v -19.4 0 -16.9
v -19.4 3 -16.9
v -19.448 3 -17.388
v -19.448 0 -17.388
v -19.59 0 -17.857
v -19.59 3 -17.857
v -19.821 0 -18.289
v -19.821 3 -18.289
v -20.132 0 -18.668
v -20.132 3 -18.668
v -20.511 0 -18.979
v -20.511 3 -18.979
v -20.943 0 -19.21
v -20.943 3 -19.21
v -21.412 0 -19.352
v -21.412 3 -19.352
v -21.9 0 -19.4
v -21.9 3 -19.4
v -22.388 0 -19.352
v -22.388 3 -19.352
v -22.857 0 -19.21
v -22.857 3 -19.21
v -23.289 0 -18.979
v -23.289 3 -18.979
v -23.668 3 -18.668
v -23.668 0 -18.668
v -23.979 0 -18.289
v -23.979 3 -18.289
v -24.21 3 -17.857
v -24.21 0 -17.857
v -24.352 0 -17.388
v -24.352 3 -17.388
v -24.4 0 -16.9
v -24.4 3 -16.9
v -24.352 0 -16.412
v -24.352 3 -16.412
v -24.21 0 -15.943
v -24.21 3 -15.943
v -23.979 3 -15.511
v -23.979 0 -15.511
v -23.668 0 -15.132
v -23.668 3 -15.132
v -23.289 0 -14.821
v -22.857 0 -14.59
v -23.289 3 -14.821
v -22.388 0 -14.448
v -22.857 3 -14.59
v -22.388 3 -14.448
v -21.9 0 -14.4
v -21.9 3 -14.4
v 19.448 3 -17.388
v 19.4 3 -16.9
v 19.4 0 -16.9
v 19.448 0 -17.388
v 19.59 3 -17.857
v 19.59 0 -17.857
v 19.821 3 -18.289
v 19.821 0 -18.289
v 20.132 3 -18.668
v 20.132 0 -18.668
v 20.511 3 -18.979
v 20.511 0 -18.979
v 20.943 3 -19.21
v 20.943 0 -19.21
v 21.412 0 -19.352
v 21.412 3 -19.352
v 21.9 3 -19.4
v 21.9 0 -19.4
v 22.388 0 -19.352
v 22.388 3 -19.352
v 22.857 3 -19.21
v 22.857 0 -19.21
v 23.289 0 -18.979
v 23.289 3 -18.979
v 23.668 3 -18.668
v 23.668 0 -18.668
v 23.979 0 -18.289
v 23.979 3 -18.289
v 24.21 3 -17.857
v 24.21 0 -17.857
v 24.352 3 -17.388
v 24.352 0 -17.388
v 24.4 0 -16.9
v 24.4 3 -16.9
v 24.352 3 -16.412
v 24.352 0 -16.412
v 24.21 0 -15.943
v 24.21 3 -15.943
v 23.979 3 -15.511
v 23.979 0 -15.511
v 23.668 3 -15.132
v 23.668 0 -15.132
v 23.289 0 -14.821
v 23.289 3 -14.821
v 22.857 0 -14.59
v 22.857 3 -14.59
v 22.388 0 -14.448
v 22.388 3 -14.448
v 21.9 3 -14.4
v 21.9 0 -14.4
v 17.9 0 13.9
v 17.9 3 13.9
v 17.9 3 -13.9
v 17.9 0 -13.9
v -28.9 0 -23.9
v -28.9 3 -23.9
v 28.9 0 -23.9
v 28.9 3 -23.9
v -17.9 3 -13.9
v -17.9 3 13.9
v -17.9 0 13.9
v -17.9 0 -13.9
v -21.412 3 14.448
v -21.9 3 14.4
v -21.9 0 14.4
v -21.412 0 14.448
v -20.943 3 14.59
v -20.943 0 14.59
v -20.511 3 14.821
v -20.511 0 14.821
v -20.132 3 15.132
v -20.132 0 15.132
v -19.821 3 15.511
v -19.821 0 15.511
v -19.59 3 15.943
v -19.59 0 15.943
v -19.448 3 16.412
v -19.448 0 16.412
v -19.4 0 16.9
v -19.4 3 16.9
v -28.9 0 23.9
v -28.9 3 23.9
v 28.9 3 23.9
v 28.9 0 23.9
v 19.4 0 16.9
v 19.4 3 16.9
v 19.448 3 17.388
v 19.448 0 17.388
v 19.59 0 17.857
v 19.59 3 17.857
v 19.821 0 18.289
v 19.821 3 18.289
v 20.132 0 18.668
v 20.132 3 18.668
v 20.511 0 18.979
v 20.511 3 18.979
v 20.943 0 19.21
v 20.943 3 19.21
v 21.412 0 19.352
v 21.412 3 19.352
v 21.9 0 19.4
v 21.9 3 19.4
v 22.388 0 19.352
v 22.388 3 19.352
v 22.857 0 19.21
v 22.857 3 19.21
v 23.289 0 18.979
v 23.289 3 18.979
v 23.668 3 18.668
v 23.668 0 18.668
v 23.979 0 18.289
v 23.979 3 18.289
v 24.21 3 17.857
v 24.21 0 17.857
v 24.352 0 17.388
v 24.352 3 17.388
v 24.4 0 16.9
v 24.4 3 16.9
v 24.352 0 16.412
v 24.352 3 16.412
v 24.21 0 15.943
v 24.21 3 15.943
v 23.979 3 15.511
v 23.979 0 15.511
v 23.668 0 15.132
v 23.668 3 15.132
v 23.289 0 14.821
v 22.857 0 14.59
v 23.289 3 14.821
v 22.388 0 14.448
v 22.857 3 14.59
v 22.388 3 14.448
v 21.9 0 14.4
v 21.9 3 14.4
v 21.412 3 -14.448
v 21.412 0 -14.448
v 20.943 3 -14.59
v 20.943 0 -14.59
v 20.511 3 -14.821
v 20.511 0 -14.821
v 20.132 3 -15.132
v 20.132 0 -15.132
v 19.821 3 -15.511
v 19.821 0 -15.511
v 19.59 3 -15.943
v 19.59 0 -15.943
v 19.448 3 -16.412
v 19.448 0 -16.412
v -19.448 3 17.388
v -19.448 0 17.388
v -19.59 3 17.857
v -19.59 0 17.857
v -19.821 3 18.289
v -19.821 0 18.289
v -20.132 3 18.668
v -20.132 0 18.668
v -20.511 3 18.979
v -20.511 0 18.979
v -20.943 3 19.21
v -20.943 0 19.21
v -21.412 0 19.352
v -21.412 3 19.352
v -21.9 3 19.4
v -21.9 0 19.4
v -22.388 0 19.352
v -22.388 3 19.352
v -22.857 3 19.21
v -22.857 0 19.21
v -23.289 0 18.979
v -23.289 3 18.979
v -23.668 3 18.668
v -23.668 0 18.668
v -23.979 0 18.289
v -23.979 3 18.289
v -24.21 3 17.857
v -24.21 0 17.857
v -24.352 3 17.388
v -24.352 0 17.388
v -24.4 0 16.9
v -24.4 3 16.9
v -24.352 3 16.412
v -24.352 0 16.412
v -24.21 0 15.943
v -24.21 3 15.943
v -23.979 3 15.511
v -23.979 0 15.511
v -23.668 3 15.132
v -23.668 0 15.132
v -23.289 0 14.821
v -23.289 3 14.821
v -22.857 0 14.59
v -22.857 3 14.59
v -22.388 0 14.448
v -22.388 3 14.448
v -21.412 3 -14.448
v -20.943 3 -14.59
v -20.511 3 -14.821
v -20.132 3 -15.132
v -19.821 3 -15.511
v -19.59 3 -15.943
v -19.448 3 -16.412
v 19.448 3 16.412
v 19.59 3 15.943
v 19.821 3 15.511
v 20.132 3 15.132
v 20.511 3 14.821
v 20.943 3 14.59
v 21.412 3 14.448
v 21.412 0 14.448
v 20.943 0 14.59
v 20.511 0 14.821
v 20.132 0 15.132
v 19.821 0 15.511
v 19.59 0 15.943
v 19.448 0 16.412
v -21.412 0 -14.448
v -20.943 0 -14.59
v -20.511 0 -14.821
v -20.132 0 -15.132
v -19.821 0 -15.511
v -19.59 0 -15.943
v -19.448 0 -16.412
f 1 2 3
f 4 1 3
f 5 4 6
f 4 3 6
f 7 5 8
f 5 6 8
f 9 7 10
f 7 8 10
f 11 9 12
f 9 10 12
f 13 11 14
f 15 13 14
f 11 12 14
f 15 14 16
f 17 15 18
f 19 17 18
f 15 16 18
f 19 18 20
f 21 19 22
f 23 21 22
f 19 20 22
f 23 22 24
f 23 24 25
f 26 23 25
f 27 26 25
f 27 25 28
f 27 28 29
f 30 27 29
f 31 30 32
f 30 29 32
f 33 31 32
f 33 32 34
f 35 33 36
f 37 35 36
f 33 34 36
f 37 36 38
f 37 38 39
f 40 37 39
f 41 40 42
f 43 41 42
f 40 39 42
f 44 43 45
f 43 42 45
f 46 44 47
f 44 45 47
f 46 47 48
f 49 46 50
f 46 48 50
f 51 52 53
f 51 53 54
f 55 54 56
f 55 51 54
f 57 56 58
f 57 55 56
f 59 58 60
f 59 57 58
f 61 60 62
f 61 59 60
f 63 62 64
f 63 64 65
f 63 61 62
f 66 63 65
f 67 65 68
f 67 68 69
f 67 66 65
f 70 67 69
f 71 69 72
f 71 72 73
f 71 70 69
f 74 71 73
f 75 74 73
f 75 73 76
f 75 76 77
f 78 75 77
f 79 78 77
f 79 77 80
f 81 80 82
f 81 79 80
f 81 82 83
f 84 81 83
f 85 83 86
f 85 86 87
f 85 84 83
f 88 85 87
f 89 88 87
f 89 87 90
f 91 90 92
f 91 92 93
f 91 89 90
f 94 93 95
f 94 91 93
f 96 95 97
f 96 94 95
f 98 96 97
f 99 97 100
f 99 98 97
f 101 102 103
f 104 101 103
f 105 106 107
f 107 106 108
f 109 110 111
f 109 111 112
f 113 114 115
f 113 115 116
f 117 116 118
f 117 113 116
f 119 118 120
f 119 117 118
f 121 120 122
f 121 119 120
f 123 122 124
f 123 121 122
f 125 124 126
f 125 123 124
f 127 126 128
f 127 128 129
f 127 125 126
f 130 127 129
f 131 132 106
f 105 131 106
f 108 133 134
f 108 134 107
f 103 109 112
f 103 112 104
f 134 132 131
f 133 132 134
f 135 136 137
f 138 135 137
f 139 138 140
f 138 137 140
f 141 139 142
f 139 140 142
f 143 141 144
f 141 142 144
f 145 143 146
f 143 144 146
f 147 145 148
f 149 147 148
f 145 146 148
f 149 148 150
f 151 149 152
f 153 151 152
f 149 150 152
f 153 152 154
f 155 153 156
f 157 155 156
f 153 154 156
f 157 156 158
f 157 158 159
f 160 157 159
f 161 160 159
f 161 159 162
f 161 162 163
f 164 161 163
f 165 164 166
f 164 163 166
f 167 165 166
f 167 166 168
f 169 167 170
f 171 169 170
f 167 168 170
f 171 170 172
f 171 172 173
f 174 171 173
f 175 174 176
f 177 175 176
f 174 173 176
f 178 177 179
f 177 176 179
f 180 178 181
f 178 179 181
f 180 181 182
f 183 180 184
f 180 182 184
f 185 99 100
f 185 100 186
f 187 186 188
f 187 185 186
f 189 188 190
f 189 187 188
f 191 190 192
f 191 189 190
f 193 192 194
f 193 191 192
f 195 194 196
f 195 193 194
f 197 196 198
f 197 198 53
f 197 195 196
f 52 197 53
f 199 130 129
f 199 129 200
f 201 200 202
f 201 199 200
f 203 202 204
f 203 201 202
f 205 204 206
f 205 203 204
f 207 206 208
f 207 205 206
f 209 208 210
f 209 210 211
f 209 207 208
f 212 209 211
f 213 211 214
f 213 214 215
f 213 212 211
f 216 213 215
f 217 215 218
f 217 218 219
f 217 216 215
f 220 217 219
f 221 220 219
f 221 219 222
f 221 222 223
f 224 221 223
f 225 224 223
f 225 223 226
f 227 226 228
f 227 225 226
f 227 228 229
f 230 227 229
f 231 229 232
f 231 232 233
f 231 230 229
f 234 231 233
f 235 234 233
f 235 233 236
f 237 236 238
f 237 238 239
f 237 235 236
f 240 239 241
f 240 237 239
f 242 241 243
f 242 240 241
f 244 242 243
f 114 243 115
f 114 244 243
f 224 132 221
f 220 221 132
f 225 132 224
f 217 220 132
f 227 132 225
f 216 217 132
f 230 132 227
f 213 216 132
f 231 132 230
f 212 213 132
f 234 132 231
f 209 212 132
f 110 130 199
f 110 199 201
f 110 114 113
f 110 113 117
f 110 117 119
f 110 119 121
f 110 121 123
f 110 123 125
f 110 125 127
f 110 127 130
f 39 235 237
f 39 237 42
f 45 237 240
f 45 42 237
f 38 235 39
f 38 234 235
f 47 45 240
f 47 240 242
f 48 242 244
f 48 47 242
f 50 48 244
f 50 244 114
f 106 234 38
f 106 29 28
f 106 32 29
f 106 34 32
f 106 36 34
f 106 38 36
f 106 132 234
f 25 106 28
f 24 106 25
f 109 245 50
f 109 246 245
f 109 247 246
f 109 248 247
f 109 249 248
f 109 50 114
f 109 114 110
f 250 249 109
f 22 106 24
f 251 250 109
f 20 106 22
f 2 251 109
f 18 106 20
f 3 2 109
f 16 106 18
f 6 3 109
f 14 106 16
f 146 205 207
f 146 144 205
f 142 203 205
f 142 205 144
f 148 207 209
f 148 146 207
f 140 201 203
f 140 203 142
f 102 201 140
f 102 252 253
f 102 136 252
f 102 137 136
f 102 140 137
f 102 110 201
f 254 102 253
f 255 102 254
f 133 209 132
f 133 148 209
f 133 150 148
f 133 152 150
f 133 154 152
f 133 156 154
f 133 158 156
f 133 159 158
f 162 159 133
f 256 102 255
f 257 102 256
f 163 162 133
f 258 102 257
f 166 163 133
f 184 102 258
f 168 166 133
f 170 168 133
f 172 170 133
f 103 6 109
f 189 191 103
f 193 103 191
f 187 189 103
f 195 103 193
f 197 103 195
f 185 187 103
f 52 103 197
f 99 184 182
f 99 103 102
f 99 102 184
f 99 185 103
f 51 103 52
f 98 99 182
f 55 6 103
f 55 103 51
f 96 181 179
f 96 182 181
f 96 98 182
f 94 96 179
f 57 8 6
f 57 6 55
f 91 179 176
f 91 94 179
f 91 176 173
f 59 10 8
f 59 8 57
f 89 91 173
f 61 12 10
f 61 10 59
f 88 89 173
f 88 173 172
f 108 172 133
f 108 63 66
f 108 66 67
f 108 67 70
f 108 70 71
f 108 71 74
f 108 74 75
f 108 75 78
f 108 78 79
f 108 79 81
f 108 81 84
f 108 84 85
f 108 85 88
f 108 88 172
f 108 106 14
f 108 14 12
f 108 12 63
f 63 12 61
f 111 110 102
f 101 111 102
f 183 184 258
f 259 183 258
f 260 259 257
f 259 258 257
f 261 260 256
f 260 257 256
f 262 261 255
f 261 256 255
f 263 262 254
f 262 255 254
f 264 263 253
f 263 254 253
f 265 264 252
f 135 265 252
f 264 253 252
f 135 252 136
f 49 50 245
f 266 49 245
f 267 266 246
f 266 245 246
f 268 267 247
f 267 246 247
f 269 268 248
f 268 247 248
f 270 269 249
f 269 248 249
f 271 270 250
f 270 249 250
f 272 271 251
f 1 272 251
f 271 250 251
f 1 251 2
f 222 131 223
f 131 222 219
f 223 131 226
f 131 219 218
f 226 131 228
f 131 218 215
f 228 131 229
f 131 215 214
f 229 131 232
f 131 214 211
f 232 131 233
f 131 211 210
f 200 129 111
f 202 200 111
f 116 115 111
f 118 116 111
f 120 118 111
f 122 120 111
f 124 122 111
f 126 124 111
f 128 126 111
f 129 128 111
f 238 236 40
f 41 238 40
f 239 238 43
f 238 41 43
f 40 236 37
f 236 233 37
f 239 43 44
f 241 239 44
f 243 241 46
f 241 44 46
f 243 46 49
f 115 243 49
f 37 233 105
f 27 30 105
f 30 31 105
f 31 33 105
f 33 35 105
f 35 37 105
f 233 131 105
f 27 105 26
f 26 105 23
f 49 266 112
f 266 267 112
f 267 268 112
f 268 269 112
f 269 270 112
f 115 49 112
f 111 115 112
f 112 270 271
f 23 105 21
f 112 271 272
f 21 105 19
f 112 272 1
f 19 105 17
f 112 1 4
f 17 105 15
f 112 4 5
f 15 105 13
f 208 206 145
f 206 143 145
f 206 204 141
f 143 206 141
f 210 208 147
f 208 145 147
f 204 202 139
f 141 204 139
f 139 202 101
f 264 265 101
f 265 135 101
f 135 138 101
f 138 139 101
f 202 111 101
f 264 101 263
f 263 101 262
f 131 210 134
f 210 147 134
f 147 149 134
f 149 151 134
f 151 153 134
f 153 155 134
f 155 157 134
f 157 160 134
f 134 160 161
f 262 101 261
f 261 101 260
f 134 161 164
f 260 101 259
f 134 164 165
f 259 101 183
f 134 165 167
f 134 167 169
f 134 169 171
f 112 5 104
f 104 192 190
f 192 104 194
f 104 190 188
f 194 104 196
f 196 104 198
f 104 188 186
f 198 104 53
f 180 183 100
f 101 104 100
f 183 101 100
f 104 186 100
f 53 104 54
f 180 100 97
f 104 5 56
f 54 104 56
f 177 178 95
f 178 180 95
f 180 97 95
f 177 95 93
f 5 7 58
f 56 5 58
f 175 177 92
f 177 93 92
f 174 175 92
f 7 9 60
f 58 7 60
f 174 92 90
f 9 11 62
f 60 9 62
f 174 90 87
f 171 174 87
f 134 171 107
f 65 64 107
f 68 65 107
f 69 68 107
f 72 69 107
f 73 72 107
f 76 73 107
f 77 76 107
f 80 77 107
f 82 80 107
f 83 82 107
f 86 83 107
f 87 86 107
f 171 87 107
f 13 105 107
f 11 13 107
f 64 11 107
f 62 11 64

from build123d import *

# Parameters (mm, degrees)
SKETCH1_W                                = 49.8
SKETCH1_H                                = 39.8
BOSS_EXTRUDE1_DEPTH                      = 3
CUT_EXTRUDE1_DEPTH                       = 3
MIRROR1_AT_THE_SECOND_PLANE_COPY_1_DEPTH = 3
SKETCH3_W                                = 35.8
SKETCH3_H                                = 27.8
CUT_EXTRUDE2_DEPTH                       = 3
SKETCH4_W                                = 57.8
SKETCH4_H                                = 47.8
SKETCH4_W_2                              = 49.8
SKETCH4_H_2                              = 39.8
BOSS_EXTRUDE2_DEPTH                      = 3


with BuildPart() as part:
    # Sketch1 → Boss-Extrude1 (new body)
    with BuildSketch(Plane(origin=(0, 0, 0), x_dir=(1, 0, 0), z_dir=(0, 1, 0))):
        Rectangle(SKETCH1_W, SKETCH1_H)
    extrude(amount=BOSS_EXTRUDE1_DEPTH)

    # Sketch2 → Cut-Extrude1 (cut)
    with BuildSketch(Plane(origin=(0, 3, 0), x_dir=(1, 0, 0), z_dir=(0, 1, 0))):
        with BuildLine():
            ThreePointArc((-21.9, 14.4), (-20.132233047, 15.132233047), (-19.4, 16.9))
            Line((-19.4, 16.9), (-21.9, 16.9))
            Line((-21.9, 16.9), (-21.9, 14.4))
        make_face()
        with BuildLine():
            Line((-21.9, 16.9), (-19.4, 16.9))
            ThreePointArc((-19.4, 16.9), (-23.667766953, 18.667766953), (-21.9, 14.4))
            Line((-21.9, 14.4), (-21.9, 16.9))
        make_face()
    cut_extrude1 = extrude(amount=-CUT_EXTRUDE1_DEPTH, mode=Mode.SUBTRACT)

    # Mirror1: Cut-Extrude1 across plane
    add(cut_extrude1.mirror(Plane(origin=(0, 0, 0), x_dir=(0, 0, 1), z_dir=(1, 0, 0))), mode=Mode.SUBTRACT)

    # Mirror1 at the second plane: Cut-Extrude1 across plane
    add(cut_extrude1.mirror(Plane(origin=(0, 0, 0), x_dir=(1, 0, 0), z_dir=(0, 0, -1))), mode=Mode.SUBTRACT)

    # Mirror1 at the second plane copy 1 sketc → Mirror1 at the second plane copy 1 (cut)
    with BuildSketch(Plane(origin=(0, 3, 0), x_dir=(-1, 0, 0), z_dir=(0, 1, 0))):
        with BuildLine():
            ThreePointArc((-21.9, 14.4), (-20.132233047, 15.132233047), (-19.4, 16.9))
            Line((-19.4, 16.9), (-21.9, 16.9))
            Line((-21.9, 16.9), (-21.9, 14.4))
        make_face()
        with BuildLine():
            Line((-21.9, 16.9), (-19.4, 16.9))
            ThreePointArc((-19.4, 16.9), (-23.667766953, 18.667766953), (-21.9, 14.4))
            Line((-21.9, 14.4), (-21.9, 16.9))
        make_face()
    extrude(amount=-MIRROR1_AT_THE_SECOND_PLANE_COPY_1_DEPTH, mode=Mode.SUBTRACT)

    # Sketch3 → Cut-Extrude2 (cut)
    with BuildSketch(Plane(origin=(0, 3, 0), x_dir=(1, 0, 0), z_dir=(0, 1, 0))):
        Rectangle(SKETCH3_W, SKETCH3_H)
    extrude(amount=-CUT_EXTRUDE2_DEPTH, mode=Mode.SUBTRACT)

    # Sketch4 → Boss-Extrude2 (add)
    with BuildSketch(Plane(origin=(0, 3, 0), x_dir=(1, 0, 0), z_dir=(0, 1, 0))):
        Rectangle(SKETCH4_W, SKETCH4_H)
        Rectangle(SKETCH4_W_2, SKETCH4_H_2, mode=Mode.SUBTRACT)
    extrude(amount=-BOSS_EXTRUDE2_DEPTH)


solid = part.part
